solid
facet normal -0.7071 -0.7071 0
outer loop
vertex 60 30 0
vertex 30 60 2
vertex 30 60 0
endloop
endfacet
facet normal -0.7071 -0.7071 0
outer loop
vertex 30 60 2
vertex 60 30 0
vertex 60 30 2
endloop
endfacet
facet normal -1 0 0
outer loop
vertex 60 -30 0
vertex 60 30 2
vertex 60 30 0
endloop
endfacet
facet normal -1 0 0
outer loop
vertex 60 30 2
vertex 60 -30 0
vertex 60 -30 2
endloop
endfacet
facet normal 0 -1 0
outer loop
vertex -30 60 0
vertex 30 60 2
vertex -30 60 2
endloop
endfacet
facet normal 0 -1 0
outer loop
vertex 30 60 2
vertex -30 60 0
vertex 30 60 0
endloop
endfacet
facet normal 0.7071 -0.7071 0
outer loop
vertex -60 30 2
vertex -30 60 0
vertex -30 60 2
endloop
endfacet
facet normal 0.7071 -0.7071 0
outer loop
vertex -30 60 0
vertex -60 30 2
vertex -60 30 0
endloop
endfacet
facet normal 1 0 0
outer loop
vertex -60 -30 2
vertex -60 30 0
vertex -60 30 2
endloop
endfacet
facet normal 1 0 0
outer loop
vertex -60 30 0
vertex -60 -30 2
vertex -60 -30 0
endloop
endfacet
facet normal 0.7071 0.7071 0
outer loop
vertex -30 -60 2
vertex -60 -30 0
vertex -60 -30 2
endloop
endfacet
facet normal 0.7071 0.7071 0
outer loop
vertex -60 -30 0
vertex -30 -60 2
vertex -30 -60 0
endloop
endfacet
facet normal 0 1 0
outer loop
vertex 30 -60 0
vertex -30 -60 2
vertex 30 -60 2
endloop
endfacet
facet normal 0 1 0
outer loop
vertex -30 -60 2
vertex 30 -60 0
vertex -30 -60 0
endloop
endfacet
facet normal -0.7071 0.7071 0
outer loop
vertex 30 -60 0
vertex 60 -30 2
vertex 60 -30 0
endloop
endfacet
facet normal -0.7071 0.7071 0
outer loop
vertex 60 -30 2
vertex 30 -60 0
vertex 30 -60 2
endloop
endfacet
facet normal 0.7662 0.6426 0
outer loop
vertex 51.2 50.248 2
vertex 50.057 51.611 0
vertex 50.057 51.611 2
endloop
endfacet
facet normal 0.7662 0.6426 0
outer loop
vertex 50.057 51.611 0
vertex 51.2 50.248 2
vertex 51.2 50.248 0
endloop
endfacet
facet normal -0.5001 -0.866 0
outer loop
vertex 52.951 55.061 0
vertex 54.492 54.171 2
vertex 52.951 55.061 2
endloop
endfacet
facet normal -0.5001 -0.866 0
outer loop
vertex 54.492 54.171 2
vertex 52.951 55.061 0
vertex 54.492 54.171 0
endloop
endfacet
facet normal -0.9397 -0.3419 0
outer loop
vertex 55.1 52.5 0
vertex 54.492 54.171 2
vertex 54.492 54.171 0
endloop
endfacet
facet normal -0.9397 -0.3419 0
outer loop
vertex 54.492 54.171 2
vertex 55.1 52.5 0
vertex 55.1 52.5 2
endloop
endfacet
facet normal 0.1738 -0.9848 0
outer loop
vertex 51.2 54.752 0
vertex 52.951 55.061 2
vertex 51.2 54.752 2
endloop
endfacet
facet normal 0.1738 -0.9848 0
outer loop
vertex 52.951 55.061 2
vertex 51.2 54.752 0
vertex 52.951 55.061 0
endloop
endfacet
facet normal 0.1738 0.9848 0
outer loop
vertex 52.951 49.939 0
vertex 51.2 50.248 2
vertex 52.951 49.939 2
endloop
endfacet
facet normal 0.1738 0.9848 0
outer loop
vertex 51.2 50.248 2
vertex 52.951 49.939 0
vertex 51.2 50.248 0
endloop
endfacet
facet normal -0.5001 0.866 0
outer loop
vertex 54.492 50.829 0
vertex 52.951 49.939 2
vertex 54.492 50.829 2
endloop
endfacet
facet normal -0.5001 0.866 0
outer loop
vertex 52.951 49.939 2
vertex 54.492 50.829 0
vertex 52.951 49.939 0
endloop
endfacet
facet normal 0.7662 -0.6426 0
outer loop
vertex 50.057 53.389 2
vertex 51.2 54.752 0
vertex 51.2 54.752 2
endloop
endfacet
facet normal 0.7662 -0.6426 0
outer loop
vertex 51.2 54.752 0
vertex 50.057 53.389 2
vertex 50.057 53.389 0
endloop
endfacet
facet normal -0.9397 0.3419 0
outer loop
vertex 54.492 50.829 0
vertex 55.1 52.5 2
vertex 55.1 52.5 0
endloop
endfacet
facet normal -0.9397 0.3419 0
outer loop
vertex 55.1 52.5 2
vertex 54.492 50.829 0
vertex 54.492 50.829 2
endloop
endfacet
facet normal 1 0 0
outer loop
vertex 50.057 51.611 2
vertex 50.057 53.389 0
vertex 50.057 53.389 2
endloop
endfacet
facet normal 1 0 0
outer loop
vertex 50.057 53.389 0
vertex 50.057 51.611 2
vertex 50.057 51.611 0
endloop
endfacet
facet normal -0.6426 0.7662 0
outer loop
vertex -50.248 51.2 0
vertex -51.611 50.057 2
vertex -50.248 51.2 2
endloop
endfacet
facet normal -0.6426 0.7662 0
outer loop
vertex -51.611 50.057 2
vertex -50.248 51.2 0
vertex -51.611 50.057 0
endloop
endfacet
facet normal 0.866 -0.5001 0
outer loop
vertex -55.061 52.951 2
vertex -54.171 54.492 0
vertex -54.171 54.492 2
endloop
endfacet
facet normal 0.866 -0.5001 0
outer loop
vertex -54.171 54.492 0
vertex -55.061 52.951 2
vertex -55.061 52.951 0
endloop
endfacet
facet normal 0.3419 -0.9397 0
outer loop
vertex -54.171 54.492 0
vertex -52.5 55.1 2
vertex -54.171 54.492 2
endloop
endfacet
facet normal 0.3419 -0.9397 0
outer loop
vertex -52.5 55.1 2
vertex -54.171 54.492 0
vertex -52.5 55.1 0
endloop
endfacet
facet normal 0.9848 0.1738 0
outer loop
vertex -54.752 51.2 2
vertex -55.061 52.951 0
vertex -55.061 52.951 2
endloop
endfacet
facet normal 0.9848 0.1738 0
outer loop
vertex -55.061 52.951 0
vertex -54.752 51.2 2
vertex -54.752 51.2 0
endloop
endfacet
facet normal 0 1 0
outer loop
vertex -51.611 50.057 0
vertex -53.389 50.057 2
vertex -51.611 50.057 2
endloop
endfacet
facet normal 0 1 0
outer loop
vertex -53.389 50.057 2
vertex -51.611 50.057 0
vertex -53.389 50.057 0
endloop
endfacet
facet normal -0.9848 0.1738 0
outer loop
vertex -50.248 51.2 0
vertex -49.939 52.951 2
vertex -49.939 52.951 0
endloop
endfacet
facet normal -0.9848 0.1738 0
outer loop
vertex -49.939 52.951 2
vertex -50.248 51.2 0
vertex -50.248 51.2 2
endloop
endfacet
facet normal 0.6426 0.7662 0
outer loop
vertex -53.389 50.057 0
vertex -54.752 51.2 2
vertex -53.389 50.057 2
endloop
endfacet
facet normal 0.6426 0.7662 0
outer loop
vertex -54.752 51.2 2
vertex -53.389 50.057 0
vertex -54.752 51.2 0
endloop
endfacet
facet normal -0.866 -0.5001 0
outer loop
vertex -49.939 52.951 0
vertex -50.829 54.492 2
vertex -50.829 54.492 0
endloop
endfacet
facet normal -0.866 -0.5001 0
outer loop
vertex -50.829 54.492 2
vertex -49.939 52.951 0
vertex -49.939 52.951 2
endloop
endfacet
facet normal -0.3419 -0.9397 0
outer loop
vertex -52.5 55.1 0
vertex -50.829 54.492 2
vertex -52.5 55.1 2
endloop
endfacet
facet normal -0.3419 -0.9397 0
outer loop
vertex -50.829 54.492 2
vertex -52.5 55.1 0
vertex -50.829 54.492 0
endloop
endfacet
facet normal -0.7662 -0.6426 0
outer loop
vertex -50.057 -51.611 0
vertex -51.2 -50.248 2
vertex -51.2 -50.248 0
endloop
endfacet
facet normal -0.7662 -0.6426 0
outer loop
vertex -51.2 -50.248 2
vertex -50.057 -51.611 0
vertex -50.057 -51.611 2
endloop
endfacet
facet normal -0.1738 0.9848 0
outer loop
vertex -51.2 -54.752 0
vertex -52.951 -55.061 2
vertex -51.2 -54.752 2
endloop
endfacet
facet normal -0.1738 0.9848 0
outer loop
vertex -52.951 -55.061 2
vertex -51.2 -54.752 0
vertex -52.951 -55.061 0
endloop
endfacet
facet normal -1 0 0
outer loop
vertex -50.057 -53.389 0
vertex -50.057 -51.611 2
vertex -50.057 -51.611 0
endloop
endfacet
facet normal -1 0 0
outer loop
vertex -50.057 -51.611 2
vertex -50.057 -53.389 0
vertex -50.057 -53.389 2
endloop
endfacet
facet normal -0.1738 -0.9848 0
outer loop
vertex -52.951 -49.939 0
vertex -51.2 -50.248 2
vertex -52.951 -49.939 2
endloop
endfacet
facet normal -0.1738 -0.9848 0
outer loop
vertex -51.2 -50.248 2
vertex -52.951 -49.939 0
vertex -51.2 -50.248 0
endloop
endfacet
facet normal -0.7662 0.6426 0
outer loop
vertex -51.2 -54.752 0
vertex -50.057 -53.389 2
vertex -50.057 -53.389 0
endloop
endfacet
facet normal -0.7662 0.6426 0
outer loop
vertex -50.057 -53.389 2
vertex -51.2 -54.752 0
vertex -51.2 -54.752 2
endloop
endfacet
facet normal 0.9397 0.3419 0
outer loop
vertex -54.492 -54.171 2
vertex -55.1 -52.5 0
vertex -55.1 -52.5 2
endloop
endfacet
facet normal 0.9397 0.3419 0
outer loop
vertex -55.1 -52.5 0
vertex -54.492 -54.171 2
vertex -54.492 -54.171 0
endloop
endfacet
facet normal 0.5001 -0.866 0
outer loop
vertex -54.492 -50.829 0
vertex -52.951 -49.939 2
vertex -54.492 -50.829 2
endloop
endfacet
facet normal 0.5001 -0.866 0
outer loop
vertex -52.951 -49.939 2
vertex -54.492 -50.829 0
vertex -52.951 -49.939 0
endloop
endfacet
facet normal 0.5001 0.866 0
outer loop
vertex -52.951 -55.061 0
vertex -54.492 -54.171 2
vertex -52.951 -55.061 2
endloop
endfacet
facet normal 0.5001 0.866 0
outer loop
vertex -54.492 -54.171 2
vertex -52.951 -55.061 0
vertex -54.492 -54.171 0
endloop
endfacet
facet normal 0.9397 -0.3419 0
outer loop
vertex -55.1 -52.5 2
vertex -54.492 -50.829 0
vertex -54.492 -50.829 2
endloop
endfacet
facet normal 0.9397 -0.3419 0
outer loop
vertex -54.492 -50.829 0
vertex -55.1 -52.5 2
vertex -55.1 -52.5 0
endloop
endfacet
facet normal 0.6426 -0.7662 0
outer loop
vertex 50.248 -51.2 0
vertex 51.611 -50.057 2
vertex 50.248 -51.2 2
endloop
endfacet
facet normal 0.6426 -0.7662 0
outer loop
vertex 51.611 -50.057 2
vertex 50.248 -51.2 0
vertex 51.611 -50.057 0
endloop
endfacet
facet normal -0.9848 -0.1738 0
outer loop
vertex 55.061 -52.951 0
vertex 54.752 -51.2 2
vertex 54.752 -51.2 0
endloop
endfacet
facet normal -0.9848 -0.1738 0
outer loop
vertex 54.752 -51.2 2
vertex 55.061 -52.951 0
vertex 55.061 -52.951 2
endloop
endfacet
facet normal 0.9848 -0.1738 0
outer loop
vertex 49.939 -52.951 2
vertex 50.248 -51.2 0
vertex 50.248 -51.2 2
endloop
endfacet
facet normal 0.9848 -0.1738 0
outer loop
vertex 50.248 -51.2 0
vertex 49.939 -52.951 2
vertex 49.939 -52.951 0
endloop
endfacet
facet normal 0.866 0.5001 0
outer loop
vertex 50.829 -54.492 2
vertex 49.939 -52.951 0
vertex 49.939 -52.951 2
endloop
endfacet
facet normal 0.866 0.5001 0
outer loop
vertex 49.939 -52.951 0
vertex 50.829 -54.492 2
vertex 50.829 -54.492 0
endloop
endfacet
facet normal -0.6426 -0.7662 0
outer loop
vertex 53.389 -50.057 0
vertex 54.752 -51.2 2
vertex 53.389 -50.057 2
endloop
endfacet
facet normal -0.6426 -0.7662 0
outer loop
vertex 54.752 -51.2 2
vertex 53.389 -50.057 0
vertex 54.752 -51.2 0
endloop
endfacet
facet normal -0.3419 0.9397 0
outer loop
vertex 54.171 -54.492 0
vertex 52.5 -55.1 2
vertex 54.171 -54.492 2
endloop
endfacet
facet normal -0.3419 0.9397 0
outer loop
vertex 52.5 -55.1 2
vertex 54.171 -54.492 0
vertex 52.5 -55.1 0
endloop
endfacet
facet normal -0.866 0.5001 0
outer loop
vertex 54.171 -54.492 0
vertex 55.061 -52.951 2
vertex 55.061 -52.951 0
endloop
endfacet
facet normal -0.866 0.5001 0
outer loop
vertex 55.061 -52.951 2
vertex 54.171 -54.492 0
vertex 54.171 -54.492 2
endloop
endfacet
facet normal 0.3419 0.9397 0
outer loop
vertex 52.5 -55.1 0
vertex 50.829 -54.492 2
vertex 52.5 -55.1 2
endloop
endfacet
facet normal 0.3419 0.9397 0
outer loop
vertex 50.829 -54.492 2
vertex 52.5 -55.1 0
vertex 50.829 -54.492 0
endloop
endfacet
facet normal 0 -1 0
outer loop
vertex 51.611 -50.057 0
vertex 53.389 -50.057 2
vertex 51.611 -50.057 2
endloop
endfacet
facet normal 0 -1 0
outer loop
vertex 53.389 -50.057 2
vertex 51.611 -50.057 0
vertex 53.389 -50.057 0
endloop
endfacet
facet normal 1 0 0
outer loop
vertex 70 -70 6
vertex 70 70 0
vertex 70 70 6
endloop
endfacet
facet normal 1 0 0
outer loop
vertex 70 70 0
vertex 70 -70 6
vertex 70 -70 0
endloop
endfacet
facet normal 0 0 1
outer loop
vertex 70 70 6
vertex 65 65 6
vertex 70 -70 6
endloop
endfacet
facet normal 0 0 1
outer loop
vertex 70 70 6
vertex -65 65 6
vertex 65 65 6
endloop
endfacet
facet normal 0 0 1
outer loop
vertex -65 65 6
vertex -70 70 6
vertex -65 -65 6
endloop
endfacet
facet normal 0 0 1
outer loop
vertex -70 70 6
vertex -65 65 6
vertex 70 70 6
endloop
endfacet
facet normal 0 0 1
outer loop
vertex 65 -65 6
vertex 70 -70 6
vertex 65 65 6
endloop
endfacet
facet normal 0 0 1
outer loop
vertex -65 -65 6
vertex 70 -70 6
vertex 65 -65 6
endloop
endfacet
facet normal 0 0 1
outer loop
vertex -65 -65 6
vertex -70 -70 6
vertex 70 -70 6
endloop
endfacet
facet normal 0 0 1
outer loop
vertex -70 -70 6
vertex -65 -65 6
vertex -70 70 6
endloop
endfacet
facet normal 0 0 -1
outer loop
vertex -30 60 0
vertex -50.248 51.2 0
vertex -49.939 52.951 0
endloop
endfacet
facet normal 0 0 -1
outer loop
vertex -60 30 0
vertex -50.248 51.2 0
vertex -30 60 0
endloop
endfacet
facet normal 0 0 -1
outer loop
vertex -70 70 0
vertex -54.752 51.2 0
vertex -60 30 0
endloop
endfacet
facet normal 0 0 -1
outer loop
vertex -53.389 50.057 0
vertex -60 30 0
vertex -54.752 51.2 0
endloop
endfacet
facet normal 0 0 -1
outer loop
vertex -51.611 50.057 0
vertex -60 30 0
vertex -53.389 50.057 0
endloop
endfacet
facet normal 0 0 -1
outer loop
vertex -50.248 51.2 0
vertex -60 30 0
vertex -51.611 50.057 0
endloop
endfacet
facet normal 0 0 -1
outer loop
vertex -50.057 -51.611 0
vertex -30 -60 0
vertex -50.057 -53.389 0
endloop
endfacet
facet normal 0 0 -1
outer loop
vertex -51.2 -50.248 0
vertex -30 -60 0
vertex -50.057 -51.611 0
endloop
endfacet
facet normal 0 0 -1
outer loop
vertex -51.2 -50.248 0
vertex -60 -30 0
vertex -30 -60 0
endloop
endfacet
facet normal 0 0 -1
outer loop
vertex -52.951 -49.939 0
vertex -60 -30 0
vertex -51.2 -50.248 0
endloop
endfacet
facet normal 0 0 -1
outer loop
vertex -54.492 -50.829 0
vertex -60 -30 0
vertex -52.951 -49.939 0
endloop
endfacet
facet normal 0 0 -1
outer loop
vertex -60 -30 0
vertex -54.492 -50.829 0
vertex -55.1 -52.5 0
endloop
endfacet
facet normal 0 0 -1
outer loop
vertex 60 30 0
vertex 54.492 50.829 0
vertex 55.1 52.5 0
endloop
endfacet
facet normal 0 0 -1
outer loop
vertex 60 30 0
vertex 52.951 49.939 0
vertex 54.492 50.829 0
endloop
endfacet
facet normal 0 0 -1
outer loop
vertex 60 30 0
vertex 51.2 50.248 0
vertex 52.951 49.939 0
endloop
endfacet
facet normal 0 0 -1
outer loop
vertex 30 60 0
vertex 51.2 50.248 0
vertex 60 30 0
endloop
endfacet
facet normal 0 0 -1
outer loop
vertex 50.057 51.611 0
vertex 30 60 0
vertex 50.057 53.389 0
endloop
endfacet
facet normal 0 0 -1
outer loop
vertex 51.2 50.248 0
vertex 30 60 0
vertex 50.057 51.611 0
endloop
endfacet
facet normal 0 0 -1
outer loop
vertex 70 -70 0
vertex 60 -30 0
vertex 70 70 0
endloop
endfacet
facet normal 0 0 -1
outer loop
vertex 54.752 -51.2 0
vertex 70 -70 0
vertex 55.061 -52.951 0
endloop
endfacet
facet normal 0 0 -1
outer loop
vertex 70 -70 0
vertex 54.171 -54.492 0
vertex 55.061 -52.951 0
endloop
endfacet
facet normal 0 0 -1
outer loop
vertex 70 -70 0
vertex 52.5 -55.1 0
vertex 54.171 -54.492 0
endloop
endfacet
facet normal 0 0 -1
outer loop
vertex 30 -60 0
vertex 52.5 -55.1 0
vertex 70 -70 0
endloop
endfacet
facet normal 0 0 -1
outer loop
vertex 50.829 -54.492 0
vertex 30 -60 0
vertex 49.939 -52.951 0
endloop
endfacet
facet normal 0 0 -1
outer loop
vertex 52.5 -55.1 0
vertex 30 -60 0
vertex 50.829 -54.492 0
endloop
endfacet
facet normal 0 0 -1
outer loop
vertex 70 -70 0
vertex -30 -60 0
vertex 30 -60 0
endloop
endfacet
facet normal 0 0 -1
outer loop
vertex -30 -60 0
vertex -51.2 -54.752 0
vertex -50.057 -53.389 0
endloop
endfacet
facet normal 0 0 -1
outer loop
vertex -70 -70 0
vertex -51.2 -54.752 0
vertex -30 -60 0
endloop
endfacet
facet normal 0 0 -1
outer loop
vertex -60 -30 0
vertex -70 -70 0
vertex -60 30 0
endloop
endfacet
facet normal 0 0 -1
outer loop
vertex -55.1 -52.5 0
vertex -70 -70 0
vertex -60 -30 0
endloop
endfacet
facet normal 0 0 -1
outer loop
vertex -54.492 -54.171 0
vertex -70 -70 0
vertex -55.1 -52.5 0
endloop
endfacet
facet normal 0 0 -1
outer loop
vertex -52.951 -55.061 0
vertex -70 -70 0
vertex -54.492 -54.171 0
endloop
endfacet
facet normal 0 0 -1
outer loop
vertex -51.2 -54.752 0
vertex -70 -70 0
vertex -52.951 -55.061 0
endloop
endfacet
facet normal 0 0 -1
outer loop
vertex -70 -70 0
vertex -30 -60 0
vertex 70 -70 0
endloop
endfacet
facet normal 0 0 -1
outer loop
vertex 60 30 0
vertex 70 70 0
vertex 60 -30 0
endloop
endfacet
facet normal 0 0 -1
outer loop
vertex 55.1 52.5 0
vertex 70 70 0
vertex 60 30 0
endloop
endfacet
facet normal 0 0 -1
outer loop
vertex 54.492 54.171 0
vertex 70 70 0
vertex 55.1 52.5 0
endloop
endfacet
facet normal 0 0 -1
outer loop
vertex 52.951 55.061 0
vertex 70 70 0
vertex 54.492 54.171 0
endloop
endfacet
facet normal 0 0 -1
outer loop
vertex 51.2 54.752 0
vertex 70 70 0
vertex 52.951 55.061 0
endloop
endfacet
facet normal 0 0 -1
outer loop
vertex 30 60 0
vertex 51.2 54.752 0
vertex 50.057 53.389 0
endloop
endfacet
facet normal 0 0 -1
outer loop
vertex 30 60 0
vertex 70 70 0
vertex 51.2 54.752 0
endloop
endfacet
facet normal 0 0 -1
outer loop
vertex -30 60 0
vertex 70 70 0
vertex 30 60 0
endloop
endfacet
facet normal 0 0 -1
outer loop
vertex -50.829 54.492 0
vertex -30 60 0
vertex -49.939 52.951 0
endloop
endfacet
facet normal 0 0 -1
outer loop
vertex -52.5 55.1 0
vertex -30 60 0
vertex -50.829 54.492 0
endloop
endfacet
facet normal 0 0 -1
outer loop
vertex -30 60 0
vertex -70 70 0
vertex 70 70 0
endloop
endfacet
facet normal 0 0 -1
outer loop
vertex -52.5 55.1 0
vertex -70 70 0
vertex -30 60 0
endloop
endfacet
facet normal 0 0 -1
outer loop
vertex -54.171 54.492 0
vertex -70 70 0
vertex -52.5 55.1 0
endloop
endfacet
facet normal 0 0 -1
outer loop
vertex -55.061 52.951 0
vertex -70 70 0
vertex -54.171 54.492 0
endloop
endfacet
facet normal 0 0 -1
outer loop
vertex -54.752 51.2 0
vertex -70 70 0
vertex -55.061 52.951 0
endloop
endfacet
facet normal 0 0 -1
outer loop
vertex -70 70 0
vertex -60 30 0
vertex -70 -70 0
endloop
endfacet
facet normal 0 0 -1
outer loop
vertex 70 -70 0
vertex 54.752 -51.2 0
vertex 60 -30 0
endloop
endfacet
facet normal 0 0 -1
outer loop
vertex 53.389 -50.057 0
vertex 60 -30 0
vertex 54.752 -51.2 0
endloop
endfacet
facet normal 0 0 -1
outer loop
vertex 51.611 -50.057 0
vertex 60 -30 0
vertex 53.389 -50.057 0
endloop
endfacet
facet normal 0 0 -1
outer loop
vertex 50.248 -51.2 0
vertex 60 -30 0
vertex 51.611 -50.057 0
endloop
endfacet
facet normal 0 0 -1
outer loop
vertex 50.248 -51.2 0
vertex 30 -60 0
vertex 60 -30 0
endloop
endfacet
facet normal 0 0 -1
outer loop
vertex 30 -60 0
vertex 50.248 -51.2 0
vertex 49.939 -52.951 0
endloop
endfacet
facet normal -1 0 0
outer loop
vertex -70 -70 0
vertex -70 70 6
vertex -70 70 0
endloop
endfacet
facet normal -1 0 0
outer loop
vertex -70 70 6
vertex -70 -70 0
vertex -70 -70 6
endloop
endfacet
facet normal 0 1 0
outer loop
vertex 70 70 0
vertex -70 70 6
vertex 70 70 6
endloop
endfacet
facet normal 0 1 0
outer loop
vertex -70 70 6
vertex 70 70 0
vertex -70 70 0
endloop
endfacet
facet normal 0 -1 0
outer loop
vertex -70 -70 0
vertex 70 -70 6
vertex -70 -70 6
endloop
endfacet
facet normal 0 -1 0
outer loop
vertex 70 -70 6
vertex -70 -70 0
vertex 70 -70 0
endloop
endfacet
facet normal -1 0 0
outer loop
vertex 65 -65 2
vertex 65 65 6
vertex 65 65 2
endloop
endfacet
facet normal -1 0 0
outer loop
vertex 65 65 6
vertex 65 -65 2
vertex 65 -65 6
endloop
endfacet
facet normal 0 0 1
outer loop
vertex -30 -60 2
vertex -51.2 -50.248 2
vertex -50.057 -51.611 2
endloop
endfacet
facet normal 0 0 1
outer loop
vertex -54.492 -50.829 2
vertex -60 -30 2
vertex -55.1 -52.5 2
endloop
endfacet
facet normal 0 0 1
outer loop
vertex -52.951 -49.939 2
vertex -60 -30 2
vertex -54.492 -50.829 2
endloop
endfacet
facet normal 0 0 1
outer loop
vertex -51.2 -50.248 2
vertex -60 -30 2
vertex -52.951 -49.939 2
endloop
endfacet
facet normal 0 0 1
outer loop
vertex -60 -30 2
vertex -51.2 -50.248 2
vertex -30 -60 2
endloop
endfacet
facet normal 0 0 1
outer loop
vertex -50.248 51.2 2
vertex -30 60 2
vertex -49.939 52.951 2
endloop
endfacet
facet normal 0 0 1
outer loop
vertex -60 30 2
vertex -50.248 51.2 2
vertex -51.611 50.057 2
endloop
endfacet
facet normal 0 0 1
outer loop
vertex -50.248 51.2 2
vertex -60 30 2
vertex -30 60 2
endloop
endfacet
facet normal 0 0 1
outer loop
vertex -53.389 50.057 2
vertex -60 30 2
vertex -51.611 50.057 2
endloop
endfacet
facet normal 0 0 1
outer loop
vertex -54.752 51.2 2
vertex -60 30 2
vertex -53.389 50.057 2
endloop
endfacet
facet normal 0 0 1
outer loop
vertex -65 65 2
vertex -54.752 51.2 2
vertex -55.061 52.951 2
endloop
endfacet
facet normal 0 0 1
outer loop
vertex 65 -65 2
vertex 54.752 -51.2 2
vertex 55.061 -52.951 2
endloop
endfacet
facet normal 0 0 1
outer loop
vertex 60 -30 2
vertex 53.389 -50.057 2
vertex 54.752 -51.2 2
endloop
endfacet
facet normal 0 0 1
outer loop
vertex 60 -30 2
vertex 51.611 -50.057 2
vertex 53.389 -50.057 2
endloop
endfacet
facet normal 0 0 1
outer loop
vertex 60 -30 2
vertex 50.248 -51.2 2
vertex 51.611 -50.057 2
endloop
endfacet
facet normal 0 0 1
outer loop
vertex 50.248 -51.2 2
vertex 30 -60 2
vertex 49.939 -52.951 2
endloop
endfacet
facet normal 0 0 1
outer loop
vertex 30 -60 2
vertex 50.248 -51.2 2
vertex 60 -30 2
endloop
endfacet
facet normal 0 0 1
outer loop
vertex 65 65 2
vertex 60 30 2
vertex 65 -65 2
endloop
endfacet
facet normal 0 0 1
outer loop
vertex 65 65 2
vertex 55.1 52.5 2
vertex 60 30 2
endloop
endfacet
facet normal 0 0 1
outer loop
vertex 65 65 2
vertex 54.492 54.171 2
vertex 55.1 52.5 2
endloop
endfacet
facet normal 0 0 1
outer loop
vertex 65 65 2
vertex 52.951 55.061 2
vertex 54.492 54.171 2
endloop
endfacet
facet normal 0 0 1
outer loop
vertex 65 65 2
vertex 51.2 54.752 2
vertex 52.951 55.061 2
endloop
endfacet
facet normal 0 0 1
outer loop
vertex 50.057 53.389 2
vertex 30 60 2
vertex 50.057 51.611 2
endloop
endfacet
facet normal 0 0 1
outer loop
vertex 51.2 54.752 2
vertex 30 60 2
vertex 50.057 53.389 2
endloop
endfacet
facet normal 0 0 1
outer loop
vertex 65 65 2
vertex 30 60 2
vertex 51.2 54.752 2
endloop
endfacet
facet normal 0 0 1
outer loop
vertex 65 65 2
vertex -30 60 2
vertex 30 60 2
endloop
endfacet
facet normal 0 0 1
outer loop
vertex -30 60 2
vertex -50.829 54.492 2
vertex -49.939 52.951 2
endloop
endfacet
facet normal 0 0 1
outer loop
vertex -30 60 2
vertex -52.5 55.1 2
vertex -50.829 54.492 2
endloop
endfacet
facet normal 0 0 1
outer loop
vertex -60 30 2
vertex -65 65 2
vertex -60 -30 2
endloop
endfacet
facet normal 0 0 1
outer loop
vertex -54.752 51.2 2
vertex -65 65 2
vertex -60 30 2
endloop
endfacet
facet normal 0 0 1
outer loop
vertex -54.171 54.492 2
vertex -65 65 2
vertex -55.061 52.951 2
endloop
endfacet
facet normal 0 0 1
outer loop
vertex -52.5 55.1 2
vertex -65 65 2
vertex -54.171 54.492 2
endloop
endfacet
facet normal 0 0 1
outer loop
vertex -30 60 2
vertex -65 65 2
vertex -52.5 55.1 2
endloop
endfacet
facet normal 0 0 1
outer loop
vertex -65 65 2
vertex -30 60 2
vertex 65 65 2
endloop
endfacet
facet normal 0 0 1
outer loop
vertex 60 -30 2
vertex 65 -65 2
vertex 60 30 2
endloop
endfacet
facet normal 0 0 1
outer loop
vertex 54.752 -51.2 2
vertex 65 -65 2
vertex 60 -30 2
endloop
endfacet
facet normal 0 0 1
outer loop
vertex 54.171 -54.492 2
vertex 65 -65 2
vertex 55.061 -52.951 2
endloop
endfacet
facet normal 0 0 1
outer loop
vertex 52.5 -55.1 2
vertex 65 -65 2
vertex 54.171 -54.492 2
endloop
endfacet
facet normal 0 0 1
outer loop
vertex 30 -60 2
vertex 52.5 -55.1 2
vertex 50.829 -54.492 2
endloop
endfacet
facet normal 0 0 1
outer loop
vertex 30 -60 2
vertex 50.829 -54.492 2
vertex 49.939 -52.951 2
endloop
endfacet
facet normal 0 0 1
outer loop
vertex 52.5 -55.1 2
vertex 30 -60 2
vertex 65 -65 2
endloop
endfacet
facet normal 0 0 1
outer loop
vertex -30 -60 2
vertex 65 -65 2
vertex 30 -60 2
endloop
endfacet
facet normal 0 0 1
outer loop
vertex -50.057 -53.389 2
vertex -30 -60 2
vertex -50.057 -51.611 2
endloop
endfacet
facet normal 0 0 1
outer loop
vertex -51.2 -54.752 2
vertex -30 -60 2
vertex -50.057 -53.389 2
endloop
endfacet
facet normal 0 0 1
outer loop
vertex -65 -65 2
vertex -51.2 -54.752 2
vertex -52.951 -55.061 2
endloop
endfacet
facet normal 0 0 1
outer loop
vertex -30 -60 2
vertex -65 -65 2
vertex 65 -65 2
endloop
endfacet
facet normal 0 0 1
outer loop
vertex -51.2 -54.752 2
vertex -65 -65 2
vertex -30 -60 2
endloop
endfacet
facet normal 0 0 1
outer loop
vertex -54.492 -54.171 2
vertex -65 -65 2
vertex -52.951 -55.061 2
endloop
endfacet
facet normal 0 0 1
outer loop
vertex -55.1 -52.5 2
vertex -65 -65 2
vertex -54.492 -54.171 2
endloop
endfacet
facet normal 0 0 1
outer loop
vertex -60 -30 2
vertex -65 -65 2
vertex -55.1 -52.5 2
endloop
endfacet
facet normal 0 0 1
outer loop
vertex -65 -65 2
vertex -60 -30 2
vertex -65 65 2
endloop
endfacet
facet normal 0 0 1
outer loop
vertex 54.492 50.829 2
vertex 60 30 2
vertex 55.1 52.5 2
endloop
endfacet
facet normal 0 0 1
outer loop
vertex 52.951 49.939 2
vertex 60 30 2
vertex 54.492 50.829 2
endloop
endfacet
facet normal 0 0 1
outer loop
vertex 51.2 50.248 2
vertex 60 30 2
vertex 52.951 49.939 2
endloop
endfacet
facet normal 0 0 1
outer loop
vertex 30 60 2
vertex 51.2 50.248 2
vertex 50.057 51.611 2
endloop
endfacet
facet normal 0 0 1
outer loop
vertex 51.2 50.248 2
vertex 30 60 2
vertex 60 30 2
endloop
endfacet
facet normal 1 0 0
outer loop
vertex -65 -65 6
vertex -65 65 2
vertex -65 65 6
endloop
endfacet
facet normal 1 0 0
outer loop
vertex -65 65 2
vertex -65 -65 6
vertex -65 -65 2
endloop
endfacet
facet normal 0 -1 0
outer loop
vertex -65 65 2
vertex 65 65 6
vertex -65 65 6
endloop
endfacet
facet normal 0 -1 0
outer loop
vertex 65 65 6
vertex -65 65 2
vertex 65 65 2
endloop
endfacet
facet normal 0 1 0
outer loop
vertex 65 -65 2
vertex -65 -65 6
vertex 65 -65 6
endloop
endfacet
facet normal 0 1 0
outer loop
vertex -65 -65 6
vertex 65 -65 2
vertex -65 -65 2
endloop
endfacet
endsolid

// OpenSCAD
/* Fits the standard Hakko FA400 filters, holes for 120mm fan */

module XYCenteredCube(size) {
    translate([-size[0]/2, -size[1]/2]) cube(size);
}

module XYCenteredClippedCube(size, clip) {
    difference() {
        XYCenteredCube(size);
        for(rotate=[0,90,180,270]) {
            rotate([0,0,rotate])
            linear_extrude(100)
            polygon(points=[
                [size[0]/2 - clip, size[1]/2],
                [size[0]/2, size[1]/2 - clip],
                [size[0] / 2, size[1] / 2]]);
        }
    }
}

difference() {
    translate([-70,-70])
        cube([140,140,6]);
    // inset for filter
    translate([0,0,2])
        XYCenteredCube([130,130,10]);
    // through ~octagon
    translate([0,0,-1])
        XYCenteredClippedCube([120, 120, 10], 30);
    // holes
    for(rotate=[0:90:360])
        rotate([0,0,rotate])
        translate([105/2, 105/2,-1]) cylinder(r=2.6,h=100);
}
